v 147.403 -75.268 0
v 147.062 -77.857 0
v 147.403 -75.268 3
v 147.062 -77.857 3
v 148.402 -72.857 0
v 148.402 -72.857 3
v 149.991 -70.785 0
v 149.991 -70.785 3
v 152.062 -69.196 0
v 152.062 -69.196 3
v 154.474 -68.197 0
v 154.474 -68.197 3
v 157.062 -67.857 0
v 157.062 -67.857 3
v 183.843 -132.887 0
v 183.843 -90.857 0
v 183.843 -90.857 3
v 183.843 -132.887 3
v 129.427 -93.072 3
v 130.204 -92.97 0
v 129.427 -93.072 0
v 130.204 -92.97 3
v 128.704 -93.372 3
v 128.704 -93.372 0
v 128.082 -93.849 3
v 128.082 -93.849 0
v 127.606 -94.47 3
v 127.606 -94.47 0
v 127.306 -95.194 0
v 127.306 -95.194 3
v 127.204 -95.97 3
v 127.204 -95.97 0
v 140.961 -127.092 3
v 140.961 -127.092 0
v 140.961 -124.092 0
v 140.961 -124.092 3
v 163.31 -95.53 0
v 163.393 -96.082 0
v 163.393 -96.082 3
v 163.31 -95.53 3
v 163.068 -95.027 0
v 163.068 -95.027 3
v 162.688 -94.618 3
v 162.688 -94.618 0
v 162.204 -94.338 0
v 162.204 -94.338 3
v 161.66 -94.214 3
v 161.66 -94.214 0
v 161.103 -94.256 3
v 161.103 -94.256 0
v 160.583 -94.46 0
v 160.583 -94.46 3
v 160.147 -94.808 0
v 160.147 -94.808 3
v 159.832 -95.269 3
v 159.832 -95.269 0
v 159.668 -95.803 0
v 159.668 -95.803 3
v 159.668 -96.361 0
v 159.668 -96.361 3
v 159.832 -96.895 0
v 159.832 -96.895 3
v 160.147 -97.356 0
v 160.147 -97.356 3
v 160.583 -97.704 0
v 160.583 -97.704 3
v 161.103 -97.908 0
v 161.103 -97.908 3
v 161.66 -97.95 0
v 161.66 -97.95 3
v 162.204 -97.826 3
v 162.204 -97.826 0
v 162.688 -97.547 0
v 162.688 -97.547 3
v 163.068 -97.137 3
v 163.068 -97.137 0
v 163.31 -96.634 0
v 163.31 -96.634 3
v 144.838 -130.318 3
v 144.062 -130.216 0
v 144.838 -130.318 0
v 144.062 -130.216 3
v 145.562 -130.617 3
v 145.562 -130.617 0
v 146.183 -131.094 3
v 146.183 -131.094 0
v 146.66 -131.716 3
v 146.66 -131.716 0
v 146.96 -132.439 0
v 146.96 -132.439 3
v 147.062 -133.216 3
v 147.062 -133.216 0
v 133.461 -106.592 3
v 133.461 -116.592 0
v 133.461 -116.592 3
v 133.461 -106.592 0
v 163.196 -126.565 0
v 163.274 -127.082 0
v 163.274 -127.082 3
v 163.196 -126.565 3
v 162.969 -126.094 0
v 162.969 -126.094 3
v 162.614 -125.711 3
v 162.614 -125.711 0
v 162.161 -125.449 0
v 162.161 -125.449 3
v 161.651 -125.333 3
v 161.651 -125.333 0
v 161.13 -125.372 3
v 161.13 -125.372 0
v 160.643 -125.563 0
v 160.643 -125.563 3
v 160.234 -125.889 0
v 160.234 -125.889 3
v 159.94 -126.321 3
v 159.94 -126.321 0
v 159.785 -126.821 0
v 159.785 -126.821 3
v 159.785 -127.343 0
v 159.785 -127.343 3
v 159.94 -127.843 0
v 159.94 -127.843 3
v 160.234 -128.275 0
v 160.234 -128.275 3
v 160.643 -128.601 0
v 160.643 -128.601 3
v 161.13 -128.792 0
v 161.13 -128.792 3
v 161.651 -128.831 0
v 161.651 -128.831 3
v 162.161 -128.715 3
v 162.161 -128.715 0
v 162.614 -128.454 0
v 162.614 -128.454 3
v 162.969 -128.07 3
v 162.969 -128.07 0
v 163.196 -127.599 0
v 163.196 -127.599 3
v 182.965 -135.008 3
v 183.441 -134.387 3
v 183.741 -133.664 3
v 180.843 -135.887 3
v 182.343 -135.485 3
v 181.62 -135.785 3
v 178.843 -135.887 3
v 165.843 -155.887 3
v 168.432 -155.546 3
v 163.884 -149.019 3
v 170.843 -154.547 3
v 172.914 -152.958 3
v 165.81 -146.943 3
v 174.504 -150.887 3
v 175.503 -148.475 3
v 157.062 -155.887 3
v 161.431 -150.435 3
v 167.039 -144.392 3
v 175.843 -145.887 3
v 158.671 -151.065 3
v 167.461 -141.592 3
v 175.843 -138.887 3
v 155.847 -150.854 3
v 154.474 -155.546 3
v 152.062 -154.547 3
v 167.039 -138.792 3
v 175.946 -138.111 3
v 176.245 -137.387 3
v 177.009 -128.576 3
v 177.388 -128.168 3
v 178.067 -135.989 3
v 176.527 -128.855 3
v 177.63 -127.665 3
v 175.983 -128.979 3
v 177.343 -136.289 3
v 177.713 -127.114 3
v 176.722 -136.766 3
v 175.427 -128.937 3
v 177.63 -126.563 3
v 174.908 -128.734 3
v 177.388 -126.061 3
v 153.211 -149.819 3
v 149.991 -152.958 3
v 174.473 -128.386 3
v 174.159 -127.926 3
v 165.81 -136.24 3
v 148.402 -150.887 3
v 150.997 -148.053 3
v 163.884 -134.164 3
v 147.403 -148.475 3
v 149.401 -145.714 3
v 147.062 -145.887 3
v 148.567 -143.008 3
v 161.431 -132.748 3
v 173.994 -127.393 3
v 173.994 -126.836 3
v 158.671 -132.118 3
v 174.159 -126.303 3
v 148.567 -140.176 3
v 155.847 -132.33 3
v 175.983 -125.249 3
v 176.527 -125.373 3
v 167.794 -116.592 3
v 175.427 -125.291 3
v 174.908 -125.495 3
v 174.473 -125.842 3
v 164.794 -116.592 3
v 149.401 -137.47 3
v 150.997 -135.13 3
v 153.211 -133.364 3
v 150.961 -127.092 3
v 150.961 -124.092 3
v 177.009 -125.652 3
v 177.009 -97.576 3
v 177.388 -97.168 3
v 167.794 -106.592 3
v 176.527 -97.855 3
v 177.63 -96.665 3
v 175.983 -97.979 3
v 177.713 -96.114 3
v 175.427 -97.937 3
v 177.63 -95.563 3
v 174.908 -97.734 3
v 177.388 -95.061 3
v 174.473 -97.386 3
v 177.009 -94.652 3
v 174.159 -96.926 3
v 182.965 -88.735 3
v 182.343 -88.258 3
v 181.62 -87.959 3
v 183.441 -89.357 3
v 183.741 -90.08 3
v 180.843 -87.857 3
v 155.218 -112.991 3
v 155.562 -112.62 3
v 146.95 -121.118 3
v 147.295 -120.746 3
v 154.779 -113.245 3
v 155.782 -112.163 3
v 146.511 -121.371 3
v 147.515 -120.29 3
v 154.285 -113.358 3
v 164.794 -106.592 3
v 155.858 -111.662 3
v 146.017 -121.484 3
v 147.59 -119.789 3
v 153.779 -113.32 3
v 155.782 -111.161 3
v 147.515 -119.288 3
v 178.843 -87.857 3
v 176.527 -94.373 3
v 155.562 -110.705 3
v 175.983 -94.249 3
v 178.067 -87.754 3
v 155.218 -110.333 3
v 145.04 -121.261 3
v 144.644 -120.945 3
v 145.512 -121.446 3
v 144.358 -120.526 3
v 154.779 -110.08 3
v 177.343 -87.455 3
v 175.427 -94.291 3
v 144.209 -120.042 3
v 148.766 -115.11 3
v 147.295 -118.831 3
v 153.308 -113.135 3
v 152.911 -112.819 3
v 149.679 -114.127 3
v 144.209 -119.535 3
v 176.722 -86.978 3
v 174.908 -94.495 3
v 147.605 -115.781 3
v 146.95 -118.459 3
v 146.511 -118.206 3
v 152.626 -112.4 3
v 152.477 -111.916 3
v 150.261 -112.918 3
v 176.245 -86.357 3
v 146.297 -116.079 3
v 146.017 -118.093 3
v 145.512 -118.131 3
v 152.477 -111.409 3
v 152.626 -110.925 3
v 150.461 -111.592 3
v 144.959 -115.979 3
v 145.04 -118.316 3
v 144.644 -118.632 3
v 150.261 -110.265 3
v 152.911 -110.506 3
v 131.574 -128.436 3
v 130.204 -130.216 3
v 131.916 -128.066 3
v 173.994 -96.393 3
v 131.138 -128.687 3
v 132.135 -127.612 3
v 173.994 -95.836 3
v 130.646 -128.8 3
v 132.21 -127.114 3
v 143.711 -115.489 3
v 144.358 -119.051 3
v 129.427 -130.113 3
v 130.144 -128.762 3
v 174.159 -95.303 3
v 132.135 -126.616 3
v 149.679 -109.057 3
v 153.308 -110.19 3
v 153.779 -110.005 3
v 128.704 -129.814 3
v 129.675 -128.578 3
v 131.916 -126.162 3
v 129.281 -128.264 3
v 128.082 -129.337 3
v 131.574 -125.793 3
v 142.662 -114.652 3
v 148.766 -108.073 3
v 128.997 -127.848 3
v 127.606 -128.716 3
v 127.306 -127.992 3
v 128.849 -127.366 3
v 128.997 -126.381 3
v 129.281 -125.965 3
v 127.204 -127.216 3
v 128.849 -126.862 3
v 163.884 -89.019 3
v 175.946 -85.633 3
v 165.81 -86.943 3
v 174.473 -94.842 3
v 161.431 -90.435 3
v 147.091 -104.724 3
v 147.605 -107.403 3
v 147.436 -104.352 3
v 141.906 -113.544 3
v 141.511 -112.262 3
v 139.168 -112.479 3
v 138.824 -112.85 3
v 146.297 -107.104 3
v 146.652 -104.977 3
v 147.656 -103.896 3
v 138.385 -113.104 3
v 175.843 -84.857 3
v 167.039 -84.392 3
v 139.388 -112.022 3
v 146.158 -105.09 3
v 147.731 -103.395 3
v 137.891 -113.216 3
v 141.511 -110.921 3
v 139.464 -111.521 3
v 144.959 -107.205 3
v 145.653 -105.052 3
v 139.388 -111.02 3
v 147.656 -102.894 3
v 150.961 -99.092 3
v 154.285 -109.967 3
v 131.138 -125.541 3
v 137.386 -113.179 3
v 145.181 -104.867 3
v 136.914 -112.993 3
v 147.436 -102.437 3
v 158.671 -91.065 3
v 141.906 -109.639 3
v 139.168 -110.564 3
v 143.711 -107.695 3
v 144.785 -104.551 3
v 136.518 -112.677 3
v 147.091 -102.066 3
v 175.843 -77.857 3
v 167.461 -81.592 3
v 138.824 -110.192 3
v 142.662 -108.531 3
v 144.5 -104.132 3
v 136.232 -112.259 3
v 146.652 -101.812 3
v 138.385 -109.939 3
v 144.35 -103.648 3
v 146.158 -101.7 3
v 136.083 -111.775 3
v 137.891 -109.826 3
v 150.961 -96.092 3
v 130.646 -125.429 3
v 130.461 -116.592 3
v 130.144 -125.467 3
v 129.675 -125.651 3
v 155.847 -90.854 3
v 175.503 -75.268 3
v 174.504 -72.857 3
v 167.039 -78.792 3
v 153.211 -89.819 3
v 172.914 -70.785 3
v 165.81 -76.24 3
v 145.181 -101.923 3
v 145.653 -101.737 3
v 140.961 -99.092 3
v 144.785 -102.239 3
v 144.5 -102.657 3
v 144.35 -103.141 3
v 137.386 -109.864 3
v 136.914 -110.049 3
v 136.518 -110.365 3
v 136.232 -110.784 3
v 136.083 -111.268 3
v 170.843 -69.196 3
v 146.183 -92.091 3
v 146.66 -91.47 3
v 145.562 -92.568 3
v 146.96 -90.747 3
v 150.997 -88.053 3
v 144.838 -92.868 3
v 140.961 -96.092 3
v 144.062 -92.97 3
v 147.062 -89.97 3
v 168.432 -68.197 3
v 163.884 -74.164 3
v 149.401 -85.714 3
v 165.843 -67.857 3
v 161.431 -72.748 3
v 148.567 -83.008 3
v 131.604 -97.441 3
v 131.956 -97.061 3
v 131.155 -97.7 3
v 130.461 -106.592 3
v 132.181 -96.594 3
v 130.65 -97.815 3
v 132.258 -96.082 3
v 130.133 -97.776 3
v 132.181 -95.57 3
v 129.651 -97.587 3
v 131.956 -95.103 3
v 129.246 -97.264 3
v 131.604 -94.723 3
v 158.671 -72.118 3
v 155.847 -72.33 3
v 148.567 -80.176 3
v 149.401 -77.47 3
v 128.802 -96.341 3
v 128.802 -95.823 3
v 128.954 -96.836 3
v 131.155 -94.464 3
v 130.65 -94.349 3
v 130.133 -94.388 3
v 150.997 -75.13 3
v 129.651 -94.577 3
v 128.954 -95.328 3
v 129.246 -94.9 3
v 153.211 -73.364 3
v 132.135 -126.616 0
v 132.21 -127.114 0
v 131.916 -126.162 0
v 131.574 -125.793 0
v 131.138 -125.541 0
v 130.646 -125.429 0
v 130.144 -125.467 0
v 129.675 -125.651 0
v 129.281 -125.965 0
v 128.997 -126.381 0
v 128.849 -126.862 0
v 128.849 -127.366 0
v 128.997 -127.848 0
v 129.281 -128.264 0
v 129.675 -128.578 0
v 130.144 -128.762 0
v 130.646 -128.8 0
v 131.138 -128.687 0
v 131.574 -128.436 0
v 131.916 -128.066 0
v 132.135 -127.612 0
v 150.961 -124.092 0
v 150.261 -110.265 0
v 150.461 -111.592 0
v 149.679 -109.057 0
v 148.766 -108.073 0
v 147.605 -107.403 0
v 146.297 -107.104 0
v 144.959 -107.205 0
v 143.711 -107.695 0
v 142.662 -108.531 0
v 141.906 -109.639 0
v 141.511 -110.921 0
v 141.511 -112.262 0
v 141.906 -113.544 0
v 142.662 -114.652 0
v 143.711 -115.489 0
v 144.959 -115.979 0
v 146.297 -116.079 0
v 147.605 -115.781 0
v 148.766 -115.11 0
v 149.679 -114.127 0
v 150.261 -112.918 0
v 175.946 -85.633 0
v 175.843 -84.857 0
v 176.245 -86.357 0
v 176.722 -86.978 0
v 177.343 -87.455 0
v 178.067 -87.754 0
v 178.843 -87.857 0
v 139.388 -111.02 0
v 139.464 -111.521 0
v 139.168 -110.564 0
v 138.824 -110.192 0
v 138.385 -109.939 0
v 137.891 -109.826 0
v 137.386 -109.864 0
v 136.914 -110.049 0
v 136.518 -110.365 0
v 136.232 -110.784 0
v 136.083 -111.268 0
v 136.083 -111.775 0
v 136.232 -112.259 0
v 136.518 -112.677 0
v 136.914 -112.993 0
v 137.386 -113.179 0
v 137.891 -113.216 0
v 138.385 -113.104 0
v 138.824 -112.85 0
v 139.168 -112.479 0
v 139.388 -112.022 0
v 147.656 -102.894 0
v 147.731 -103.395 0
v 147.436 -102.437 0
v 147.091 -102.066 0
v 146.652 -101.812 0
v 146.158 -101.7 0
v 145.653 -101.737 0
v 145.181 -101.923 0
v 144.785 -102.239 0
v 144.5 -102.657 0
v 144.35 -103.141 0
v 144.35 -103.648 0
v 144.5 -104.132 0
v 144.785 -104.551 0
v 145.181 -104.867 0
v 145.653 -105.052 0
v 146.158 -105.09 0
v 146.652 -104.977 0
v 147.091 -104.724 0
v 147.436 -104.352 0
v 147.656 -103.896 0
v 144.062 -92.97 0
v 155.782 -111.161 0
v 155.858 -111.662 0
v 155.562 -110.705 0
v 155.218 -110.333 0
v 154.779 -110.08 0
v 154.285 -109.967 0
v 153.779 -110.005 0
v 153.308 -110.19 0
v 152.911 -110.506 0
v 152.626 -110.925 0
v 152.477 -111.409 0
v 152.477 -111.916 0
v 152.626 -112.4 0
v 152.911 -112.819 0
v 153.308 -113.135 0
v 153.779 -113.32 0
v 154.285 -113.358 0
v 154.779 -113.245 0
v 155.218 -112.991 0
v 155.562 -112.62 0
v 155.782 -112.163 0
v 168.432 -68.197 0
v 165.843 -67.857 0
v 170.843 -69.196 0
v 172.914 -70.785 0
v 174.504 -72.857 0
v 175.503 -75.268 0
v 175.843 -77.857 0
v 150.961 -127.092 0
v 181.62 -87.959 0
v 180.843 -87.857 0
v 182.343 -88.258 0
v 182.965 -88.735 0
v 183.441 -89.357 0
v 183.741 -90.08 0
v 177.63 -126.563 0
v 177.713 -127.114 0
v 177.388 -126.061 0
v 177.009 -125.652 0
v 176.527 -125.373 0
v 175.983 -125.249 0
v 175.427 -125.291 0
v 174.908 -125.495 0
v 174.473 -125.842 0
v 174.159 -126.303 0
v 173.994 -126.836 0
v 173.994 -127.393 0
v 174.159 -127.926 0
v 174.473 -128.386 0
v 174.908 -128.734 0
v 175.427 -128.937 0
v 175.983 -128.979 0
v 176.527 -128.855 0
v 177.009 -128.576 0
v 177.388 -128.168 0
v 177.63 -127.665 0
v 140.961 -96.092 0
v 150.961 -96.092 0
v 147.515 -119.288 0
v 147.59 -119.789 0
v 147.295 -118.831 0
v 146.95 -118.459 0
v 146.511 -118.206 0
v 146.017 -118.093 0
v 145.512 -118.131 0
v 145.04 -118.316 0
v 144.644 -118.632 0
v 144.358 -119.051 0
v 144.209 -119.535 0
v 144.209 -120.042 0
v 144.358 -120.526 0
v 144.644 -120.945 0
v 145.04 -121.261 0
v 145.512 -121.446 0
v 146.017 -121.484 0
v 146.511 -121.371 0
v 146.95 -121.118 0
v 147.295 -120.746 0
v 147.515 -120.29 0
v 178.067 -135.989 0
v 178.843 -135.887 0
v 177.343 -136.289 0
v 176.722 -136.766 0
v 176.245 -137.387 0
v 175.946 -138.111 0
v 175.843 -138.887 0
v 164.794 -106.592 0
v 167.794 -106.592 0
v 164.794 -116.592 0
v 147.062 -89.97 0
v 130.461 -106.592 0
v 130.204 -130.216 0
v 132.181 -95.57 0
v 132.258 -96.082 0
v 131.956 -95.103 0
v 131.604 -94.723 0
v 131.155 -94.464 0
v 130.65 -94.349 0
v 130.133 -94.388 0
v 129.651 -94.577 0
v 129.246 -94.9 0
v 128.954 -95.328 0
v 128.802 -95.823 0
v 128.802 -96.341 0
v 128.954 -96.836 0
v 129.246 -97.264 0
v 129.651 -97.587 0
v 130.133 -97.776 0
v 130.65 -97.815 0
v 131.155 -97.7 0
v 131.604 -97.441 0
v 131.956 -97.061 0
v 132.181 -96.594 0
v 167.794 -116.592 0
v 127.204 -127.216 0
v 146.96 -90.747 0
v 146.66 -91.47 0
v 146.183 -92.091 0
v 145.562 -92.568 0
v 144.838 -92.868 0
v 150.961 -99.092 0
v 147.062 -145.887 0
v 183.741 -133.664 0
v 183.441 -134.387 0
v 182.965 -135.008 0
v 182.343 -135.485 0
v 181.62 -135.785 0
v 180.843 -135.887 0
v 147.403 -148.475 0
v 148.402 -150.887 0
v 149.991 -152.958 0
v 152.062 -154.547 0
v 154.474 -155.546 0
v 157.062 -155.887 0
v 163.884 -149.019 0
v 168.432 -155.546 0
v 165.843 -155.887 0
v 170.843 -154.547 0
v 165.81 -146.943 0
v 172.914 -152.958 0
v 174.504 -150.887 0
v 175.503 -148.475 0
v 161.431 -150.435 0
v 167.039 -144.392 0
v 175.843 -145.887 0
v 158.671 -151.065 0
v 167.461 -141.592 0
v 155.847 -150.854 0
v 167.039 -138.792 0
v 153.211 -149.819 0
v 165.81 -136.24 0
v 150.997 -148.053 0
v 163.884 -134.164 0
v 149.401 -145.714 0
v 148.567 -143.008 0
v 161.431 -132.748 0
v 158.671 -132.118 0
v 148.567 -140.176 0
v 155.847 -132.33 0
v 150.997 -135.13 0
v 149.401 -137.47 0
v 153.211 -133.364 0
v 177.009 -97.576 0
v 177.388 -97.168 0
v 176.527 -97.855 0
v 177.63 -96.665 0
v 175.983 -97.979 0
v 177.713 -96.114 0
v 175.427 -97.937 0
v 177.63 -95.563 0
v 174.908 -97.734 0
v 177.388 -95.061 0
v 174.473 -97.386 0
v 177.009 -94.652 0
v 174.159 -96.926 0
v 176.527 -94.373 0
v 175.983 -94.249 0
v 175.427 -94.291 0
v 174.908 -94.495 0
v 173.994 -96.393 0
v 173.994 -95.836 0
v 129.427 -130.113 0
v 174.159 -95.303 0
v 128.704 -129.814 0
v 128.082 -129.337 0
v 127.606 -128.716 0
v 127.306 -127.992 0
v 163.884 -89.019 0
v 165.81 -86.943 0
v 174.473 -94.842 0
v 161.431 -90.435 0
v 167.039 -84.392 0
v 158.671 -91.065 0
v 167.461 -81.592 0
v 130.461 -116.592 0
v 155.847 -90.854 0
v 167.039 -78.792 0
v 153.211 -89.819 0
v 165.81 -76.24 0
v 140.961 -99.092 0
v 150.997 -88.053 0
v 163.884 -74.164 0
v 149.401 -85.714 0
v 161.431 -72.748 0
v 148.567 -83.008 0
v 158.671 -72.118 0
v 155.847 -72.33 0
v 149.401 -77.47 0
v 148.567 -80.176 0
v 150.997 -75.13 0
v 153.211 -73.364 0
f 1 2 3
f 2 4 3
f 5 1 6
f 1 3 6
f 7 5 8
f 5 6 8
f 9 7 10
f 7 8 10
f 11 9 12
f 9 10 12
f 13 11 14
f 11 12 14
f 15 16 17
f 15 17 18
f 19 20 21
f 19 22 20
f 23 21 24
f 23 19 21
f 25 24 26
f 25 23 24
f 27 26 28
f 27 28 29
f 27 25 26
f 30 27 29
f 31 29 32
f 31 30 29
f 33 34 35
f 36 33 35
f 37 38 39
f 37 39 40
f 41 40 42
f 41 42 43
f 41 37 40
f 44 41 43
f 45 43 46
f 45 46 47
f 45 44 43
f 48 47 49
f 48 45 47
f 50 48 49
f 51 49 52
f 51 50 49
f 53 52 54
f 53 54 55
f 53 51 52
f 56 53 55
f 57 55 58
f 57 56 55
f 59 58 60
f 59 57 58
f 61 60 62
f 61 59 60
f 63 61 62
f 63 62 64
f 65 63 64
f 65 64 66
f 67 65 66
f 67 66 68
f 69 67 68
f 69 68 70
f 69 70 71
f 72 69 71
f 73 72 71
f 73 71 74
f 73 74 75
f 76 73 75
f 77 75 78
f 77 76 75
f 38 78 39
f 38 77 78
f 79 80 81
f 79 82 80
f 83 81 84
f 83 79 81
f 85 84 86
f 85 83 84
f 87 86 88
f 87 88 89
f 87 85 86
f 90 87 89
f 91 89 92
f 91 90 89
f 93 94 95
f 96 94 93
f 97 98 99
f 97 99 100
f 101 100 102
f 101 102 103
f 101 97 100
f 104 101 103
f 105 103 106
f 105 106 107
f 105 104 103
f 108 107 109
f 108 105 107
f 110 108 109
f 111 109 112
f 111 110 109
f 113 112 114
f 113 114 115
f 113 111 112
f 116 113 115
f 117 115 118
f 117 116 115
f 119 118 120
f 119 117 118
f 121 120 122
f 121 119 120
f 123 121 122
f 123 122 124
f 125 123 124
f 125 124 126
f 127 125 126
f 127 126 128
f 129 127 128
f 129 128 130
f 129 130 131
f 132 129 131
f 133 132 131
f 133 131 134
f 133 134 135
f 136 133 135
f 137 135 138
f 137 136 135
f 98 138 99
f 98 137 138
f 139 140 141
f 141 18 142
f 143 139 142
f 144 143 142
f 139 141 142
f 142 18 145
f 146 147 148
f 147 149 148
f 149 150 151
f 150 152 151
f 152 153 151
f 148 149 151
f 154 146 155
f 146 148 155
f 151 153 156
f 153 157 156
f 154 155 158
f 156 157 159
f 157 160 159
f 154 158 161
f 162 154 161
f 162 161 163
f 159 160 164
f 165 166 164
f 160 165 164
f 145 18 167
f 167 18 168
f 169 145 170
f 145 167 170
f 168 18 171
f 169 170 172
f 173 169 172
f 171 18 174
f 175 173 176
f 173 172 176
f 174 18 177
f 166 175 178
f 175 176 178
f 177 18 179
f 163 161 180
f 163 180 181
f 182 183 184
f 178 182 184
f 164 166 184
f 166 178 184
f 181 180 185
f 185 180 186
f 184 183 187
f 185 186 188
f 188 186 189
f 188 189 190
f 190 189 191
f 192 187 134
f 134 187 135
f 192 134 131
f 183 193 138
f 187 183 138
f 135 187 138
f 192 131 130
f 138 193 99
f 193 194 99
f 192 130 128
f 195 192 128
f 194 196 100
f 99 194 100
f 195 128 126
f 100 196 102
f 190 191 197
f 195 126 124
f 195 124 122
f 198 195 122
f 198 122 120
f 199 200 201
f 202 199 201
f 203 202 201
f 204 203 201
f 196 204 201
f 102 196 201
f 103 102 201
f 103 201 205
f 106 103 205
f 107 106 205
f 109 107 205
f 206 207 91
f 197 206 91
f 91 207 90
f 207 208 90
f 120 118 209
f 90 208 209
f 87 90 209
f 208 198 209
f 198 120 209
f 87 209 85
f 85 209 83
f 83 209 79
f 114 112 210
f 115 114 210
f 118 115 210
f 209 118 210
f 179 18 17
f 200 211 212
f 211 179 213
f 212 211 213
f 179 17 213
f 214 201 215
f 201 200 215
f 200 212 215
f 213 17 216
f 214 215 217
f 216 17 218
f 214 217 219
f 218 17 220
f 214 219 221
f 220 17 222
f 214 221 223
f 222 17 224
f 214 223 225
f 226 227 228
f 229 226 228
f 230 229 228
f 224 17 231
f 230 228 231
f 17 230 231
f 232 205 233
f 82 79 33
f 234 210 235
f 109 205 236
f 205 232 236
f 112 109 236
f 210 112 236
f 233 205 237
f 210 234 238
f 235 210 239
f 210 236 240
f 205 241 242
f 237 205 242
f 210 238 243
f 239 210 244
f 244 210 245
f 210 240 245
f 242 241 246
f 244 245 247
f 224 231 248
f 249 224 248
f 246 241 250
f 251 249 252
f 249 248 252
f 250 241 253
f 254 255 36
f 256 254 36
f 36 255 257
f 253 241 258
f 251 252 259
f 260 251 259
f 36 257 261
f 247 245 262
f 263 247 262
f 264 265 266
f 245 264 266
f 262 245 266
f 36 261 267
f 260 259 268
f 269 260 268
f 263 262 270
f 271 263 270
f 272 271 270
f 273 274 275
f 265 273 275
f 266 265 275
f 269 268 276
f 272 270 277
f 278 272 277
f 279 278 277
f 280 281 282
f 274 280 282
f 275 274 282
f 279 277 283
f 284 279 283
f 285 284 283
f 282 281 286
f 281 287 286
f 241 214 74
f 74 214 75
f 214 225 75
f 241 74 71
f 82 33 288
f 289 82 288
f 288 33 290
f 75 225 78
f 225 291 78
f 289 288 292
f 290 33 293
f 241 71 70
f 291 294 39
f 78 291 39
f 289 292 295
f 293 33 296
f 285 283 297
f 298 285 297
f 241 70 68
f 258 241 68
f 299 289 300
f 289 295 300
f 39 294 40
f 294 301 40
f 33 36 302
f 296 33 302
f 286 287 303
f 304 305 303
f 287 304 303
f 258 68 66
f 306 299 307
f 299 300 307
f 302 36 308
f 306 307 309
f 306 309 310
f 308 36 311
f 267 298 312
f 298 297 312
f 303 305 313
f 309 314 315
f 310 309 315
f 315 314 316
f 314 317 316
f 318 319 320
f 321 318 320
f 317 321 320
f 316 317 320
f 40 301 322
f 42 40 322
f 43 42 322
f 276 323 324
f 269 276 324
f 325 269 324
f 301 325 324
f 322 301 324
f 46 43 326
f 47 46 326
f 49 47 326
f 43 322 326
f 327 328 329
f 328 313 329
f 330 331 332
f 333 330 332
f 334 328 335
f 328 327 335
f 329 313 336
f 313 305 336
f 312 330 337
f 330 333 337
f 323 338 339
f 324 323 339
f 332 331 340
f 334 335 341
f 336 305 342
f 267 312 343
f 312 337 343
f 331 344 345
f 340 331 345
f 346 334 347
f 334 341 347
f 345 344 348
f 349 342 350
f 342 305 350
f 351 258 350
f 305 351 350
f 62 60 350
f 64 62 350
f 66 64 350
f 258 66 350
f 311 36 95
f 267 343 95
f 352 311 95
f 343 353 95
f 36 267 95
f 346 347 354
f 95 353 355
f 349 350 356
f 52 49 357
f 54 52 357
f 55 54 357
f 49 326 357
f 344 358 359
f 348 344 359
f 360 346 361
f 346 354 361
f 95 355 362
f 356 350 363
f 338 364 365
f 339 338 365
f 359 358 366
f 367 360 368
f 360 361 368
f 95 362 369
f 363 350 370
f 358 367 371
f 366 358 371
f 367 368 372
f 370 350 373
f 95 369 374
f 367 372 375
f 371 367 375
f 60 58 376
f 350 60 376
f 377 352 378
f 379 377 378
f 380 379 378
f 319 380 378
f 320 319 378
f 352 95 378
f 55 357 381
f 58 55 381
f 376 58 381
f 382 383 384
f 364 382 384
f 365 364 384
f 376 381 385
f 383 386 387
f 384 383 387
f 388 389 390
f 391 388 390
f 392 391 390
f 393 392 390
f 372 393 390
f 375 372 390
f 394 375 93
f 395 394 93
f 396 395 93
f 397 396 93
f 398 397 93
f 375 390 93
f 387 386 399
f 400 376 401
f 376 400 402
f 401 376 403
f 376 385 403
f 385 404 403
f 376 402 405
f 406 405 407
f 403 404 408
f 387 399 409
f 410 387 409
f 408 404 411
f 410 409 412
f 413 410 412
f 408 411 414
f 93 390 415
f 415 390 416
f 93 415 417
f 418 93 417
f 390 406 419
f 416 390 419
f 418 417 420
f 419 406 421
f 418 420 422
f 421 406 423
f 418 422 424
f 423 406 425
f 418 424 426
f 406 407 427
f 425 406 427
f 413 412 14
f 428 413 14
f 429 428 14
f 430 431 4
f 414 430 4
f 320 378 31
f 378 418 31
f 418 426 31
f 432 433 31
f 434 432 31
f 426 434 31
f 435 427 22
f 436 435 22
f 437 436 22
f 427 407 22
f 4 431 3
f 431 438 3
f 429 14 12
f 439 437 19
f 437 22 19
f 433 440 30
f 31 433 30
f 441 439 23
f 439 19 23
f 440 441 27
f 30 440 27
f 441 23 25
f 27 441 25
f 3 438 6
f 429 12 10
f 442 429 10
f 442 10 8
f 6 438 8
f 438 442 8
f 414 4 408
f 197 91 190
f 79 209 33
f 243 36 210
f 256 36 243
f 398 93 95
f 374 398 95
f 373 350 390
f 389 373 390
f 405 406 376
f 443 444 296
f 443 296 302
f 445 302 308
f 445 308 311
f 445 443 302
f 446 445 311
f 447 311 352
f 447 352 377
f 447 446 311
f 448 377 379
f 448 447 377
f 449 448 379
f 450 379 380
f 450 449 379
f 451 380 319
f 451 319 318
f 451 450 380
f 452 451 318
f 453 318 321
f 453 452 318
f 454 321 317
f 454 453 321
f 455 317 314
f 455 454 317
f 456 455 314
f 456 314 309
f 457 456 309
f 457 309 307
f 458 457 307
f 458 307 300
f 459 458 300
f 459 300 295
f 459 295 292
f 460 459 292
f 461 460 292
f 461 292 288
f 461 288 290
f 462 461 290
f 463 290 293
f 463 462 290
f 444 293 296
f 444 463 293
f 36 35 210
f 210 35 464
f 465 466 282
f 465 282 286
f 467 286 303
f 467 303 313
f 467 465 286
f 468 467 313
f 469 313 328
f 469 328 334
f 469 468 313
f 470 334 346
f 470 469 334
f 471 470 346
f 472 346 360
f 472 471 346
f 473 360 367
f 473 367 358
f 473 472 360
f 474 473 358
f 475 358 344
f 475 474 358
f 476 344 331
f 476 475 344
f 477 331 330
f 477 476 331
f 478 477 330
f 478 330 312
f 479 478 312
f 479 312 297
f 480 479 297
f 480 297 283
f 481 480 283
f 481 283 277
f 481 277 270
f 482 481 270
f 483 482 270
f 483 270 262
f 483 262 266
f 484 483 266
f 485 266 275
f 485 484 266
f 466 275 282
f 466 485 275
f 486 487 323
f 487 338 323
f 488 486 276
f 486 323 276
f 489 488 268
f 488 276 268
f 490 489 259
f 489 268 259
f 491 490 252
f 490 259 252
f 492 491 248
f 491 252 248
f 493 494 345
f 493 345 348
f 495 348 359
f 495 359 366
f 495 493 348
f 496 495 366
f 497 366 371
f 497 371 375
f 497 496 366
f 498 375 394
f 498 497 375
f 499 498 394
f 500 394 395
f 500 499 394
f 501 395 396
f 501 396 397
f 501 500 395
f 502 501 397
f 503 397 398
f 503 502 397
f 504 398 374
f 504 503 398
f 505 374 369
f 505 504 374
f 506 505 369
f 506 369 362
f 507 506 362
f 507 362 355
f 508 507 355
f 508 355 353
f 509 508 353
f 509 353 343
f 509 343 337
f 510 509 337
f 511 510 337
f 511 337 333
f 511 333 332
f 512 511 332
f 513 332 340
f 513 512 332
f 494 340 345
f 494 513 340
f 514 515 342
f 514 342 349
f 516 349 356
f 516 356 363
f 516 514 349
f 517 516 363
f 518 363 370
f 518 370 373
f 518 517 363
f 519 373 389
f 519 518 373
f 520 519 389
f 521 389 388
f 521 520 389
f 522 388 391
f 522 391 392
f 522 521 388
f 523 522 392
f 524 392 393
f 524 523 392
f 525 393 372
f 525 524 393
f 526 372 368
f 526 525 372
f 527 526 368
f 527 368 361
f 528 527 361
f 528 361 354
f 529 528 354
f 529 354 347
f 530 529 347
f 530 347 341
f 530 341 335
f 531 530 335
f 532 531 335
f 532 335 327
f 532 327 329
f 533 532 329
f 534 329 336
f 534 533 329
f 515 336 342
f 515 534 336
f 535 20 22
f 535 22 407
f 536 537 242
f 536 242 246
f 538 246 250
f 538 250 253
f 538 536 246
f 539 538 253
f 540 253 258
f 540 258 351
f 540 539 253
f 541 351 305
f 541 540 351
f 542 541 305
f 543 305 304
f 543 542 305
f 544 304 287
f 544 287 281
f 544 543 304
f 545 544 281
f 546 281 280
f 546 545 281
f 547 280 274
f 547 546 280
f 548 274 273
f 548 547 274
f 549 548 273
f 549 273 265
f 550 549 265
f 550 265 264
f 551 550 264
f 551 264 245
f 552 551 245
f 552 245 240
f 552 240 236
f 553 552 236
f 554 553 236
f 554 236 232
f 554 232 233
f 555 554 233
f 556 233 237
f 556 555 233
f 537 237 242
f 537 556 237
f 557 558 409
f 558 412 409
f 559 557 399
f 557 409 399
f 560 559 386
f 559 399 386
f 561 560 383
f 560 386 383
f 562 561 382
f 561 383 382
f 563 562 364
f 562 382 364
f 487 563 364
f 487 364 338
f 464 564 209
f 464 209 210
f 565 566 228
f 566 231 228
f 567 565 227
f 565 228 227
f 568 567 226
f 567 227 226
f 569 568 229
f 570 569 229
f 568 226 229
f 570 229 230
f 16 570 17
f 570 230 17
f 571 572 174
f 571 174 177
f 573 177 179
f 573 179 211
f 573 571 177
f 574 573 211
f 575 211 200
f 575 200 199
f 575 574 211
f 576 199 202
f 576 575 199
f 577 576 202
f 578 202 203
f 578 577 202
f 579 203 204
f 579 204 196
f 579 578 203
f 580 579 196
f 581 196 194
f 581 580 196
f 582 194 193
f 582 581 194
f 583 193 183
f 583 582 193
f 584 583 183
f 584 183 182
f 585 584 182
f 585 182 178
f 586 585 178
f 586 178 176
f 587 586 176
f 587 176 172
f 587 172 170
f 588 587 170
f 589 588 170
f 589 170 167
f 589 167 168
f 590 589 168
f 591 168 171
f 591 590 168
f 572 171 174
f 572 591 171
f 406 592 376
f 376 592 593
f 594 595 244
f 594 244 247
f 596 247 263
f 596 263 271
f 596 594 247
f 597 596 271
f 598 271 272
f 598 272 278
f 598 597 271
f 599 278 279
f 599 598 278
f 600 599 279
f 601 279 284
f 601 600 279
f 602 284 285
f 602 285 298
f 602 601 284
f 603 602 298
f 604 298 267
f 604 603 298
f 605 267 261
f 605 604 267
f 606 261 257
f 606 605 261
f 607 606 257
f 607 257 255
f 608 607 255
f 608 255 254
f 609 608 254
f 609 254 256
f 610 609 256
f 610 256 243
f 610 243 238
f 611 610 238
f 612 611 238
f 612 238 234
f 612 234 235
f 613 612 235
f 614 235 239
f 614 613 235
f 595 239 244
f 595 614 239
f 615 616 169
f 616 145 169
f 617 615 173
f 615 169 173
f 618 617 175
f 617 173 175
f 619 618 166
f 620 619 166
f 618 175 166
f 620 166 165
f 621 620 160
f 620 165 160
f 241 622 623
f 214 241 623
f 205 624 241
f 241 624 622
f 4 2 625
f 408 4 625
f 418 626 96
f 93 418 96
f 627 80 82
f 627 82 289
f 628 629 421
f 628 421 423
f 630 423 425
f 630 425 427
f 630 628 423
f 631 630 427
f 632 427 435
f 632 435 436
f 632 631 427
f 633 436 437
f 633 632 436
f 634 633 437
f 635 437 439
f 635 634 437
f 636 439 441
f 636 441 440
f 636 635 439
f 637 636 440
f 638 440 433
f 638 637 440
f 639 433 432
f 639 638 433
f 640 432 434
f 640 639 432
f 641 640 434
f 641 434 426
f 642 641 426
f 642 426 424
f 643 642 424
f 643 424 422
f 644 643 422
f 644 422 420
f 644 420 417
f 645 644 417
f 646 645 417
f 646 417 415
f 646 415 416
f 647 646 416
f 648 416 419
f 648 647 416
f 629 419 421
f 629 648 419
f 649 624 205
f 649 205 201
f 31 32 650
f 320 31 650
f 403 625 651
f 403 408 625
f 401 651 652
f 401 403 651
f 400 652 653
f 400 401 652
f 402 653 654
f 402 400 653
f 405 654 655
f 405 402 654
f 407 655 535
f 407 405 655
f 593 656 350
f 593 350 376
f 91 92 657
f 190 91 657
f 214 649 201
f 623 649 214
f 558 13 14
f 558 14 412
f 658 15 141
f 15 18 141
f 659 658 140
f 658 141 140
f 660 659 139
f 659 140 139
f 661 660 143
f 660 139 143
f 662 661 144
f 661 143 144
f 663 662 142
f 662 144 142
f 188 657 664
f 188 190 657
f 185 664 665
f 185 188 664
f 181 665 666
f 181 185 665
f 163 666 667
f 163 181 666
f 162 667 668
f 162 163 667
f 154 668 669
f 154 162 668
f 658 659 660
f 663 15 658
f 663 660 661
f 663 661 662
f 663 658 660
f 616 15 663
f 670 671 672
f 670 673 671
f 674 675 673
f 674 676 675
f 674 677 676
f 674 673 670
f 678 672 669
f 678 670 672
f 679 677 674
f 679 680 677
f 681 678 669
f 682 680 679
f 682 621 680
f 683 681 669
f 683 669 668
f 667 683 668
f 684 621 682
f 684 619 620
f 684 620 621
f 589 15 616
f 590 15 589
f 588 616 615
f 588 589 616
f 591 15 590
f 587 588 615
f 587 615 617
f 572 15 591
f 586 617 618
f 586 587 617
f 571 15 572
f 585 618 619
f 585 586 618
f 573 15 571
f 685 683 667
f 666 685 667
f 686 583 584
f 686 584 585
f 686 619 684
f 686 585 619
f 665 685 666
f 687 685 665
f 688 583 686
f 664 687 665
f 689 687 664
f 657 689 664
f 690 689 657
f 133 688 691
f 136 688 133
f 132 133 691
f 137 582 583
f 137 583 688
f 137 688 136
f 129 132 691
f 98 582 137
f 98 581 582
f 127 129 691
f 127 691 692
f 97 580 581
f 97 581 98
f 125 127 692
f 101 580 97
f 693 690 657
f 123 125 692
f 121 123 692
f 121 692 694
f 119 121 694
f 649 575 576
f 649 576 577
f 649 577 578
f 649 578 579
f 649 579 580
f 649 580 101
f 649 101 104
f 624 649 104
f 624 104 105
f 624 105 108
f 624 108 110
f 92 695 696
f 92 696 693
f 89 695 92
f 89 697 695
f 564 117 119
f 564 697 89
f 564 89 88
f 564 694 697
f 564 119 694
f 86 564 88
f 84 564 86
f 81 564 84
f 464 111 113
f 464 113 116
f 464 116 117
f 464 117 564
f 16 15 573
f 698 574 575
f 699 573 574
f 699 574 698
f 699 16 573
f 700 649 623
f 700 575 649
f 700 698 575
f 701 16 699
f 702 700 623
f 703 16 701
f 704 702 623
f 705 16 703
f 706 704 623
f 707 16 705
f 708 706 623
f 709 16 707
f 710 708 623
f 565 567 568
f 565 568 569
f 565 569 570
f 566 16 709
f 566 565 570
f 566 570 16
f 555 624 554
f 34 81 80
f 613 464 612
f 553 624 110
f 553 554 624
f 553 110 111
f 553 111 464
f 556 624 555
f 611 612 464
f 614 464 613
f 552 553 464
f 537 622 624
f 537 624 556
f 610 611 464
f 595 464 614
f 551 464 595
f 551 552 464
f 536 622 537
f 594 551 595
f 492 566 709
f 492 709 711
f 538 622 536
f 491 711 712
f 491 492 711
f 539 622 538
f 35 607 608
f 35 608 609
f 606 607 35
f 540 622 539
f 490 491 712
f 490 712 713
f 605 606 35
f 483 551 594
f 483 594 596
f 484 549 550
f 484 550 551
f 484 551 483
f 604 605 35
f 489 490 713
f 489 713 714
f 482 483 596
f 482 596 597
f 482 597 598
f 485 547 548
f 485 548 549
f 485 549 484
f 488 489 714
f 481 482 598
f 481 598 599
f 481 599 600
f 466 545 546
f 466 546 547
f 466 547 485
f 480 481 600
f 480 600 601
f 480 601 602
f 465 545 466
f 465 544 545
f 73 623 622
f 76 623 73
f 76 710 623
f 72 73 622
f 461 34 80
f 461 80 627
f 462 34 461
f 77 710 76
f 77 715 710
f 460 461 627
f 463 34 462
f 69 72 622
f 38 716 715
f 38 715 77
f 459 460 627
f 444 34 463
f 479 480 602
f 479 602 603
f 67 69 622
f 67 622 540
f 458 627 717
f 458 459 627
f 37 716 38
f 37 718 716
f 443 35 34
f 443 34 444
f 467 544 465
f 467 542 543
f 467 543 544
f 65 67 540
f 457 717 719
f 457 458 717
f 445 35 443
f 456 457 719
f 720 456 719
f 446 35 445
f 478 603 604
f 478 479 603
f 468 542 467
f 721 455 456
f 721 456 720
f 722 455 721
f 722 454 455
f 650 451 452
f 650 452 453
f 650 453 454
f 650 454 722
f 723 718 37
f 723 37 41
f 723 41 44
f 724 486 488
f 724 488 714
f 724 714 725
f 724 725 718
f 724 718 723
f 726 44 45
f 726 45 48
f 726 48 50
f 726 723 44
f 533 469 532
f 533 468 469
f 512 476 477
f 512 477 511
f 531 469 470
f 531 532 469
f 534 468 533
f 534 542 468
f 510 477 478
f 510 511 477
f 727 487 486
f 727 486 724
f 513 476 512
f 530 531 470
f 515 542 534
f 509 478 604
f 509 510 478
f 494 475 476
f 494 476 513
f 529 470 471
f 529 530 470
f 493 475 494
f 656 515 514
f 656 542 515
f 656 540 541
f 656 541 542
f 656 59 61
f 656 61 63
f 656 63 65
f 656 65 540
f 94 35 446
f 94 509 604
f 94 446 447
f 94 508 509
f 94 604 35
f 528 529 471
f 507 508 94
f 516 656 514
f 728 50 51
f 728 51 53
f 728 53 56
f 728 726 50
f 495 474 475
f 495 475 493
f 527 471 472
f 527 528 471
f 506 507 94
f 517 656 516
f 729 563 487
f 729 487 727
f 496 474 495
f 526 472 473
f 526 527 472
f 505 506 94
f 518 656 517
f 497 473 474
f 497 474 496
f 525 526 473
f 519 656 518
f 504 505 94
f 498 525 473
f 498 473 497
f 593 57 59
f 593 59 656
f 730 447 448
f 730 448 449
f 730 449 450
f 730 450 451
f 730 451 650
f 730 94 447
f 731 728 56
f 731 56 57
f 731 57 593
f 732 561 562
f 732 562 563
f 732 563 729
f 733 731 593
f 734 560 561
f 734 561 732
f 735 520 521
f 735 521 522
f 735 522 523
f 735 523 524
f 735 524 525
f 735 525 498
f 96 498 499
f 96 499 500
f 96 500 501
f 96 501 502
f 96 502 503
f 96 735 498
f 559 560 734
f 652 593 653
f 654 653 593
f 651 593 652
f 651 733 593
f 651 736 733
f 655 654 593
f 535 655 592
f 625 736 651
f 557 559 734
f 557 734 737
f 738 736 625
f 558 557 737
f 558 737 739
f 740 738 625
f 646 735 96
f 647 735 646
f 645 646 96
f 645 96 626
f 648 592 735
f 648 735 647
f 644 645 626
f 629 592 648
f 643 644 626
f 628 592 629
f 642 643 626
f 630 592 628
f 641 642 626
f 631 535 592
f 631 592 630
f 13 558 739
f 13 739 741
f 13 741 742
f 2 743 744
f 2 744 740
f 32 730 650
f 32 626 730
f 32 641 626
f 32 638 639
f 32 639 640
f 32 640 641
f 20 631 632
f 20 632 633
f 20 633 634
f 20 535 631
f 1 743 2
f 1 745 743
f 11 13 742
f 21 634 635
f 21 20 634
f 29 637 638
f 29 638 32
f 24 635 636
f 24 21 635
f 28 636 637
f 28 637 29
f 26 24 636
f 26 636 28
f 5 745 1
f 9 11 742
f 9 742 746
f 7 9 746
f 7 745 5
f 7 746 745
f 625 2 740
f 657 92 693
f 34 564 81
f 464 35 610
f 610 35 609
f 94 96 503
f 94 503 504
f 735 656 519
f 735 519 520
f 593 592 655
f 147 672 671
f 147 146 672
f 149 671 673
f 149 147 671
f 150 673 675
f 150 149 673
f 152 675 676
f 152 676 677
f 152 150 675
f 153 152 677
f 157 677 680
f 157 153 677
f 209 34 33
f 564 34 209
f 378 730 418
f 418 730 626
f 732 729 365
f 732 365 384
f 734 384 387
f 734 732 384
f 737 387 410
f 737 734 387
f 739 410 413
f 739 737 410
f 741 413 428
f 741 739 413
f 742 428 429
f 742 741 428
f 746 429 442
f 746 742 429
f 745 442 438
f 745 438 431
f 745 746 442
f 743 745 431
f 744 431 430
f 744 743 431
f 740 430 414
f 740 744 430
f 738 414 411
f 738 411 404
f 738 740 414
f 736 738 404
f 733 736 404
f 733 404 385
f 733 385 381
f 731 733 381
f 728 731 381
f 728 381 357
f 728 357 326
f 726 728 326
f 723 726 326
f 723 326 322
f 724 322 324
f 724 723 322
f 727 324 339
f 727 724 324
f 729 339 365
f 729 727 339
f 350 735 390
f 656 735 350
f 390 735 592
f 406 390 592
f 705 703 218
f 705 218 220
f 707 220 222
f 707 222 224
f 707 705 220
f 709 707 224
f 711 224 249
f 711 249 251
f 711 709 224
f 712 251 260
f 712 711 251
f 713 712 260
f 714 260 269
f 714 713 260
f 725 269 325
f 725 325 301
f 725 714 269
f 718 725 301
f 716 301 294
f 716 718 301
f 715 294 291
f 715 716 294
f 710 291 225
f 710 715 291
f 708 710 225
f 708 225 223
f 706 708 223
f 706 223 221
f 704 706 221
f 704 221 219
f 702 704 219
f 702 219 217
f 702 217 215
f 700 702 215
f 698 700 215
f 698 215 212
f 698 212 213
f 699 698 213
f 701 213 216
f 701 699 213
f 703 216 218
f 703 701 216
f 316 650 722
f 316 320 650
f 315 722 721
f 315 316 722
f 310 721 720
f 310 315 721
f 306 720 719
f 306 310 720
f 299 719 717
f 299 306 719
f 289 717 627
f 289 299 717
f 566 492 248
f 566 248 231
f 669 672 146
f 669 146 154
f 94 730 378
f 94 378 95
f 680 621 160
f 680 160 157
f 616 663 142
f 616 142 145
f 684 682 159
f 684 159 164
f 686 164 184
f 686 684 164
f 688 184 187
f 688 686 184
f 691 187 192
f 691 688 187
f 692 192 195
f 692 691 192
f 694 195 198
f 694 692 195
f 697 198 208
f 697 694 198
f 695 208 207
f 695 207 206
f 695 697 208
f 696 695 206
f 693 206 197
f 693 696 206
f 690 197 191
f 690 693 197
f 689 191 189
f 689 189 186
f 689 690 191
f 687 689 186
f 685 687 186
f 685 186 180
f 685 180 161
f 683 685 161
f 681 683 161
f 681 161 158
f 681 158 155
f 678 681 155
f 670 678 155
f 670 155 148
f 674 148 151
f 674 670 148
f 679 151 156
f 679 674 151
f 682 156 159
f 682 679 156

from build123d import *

# Parameters (mm, degrees)
SKETCH1_R           = 1.737885662
SKETCH1_R_2         = 1.873200063
SKETCH1_R_3         = 1.690089146
SKETCH1_R_4         = 1.754205974
SKETCH1_R_5         = 1.7
SKETCH1_R_6         = 4.5
SKETCH1_R_7         = 1.87
SKETCH1_R_8         = 9.5
SKETCH1_W           = 3
SKETCH1_H           = 10
SKETCH1_W_2         = 10
SKETCH1_H_2         = 3
BOSS_EXTRUDE1_DEPTH = 3
FILLET1_R           = 3
FILLET2_R           = 10


with BuildPart() as part:
    # Sketch1 → Boss-Extrude1 (new body)
    with BuildSketch(Plane.XY):
        Polygon((147.061964125, -92.970138098), (147.061964125, -71.856515964), (147.061964125, -67.856515964), (175.843347401, -67.856515964), (175.843347401, -87.856515964), (183.843347401, -87.856515964), (183.843347401, -135.887076434), (175.843347401, -135.887076434), (175.843347401, -155.887076434), (147.061964125, -155.887076434), (147.061964125, -151.887076434), (147.061964125, -130.215533927), (127.203791419, -130.215533927), (127.203791419, -111.591712302), (127.203791419, -92.970138098), align=None)
        with Locations((130.520049527, -96.082032258)):
            Circle(SKETCH1_R, mode=Mode.SUBTRACT)
        with Locations((161.520049527, -96.082032258)):
            Circle(SKETCH1_R_2, mode=Mode.SUBTRACT)
        with Locations((130.520049527, -127.114221831)):
            Circle(SKETCH1_R_3, mode=Mode.SUBTRACT)
        with Locations((161.520049527, -127.082032258)):
            Circle(SKETCH1_R_4, mode=Mode.SUBTRACT)
        with Locations((154.157584865, -111.662272701)):
            Circle(SKETCH1_R_5, mode=Mode.SUBTRACT)
        with Locations((145.89014032, -119.788596448)):
            Circle(SKETCH1_R_5, mode=Mode.SUBTRACT)
        with Locations((137.763816574, -111.521151903)):
            Circle(SKETCH1_R_5, mode=Mode.SUBTRACT)
        with Locations((146.031261118, -103.394828157)):
            Circle(SKETCH1_R_5, mode=Mode.SUBTRACT)
        with Locations((145.960700719, -111.591712302)):
            Circle(SKETCH1_R_6, mode=Mode.SUBTRACT)
        with Locations((175.843347401, -96.114221831)):
            Circle(SKETCH1_R_7, mode=Mode.SUBTRACT)
        with Locations((157.960700719, -81.591712302)):
            Circle(SKETCH1_R_8, mode=Mode.SUBTRACT)
        with Locations((157.960700719, -141.591712302)):
            Circle(SKETCH1_R_8, mode=Mode.SUBTRACT)
        with Locations((175.843347401, -127.114221831)):
            Circle(SKETCH1_R_7, mode=Mode.SUBTRACT)
        with Locations((131.960700719, -111.591712302)):
            Rectangle(SKETCH1_W, SKETCH1_H, mode=Mode.SUBTRACT)
        with Locations((145.960700719, -97.591712302)):
            Rectangle(SKETCH1_W_2, SKETCH1_H_2, mode=Mode.SUBTRACT)
        with Locations((145.960700719, -125.591712302)):
            Rectangle(SKETCH1_W_2, SKETCH1_H_2, mode=Mode.SUBTRACT)
        with Locations((166.293610901, -111.591712302)):
            Rectangle(SKETCH1_W, SKETCH1_H, mode=Mode.SUBTRACT)
    extrude(amount=BOSS_EXTRUDE1_DEPTH)

    # Fillet1
    fillet1_edges = [part.edges().sort_by_distance(p)[0] for p in [
        (175.843347401, -87.856515964, 1.5),
        (183.843347401, -87.856515964, 1.5),
        (183.843347401, -135.887076434, 1.5),
        (175.843347401, -135.887076434, 1.5),
        (147.061964125, -130.215533927, 1.5),
        (127.203791419, -130.215533927, 1.5),
        (127.203791419, -92.970138098, 1.5),
        (147.061964125, -92.970138098, 1.5),
    ]]
    fillet(fillet1_edges, radius=FILLET1_R)

    # Fillet2
    fillet2_edges = [part.edges().sort_by_distance(p)[0] for p in [
        (147.061964125, -67.856515964, 1.5),
        (175.843347401, -67.856515964, 1.5),
        (175.843347401, -155.887076434, 1.5),
        (147.061964125, -155.887076434, 1.5),
    ]]
    fillet(fillet2_edges, radius=FILLET2_R)


solid = part.part
